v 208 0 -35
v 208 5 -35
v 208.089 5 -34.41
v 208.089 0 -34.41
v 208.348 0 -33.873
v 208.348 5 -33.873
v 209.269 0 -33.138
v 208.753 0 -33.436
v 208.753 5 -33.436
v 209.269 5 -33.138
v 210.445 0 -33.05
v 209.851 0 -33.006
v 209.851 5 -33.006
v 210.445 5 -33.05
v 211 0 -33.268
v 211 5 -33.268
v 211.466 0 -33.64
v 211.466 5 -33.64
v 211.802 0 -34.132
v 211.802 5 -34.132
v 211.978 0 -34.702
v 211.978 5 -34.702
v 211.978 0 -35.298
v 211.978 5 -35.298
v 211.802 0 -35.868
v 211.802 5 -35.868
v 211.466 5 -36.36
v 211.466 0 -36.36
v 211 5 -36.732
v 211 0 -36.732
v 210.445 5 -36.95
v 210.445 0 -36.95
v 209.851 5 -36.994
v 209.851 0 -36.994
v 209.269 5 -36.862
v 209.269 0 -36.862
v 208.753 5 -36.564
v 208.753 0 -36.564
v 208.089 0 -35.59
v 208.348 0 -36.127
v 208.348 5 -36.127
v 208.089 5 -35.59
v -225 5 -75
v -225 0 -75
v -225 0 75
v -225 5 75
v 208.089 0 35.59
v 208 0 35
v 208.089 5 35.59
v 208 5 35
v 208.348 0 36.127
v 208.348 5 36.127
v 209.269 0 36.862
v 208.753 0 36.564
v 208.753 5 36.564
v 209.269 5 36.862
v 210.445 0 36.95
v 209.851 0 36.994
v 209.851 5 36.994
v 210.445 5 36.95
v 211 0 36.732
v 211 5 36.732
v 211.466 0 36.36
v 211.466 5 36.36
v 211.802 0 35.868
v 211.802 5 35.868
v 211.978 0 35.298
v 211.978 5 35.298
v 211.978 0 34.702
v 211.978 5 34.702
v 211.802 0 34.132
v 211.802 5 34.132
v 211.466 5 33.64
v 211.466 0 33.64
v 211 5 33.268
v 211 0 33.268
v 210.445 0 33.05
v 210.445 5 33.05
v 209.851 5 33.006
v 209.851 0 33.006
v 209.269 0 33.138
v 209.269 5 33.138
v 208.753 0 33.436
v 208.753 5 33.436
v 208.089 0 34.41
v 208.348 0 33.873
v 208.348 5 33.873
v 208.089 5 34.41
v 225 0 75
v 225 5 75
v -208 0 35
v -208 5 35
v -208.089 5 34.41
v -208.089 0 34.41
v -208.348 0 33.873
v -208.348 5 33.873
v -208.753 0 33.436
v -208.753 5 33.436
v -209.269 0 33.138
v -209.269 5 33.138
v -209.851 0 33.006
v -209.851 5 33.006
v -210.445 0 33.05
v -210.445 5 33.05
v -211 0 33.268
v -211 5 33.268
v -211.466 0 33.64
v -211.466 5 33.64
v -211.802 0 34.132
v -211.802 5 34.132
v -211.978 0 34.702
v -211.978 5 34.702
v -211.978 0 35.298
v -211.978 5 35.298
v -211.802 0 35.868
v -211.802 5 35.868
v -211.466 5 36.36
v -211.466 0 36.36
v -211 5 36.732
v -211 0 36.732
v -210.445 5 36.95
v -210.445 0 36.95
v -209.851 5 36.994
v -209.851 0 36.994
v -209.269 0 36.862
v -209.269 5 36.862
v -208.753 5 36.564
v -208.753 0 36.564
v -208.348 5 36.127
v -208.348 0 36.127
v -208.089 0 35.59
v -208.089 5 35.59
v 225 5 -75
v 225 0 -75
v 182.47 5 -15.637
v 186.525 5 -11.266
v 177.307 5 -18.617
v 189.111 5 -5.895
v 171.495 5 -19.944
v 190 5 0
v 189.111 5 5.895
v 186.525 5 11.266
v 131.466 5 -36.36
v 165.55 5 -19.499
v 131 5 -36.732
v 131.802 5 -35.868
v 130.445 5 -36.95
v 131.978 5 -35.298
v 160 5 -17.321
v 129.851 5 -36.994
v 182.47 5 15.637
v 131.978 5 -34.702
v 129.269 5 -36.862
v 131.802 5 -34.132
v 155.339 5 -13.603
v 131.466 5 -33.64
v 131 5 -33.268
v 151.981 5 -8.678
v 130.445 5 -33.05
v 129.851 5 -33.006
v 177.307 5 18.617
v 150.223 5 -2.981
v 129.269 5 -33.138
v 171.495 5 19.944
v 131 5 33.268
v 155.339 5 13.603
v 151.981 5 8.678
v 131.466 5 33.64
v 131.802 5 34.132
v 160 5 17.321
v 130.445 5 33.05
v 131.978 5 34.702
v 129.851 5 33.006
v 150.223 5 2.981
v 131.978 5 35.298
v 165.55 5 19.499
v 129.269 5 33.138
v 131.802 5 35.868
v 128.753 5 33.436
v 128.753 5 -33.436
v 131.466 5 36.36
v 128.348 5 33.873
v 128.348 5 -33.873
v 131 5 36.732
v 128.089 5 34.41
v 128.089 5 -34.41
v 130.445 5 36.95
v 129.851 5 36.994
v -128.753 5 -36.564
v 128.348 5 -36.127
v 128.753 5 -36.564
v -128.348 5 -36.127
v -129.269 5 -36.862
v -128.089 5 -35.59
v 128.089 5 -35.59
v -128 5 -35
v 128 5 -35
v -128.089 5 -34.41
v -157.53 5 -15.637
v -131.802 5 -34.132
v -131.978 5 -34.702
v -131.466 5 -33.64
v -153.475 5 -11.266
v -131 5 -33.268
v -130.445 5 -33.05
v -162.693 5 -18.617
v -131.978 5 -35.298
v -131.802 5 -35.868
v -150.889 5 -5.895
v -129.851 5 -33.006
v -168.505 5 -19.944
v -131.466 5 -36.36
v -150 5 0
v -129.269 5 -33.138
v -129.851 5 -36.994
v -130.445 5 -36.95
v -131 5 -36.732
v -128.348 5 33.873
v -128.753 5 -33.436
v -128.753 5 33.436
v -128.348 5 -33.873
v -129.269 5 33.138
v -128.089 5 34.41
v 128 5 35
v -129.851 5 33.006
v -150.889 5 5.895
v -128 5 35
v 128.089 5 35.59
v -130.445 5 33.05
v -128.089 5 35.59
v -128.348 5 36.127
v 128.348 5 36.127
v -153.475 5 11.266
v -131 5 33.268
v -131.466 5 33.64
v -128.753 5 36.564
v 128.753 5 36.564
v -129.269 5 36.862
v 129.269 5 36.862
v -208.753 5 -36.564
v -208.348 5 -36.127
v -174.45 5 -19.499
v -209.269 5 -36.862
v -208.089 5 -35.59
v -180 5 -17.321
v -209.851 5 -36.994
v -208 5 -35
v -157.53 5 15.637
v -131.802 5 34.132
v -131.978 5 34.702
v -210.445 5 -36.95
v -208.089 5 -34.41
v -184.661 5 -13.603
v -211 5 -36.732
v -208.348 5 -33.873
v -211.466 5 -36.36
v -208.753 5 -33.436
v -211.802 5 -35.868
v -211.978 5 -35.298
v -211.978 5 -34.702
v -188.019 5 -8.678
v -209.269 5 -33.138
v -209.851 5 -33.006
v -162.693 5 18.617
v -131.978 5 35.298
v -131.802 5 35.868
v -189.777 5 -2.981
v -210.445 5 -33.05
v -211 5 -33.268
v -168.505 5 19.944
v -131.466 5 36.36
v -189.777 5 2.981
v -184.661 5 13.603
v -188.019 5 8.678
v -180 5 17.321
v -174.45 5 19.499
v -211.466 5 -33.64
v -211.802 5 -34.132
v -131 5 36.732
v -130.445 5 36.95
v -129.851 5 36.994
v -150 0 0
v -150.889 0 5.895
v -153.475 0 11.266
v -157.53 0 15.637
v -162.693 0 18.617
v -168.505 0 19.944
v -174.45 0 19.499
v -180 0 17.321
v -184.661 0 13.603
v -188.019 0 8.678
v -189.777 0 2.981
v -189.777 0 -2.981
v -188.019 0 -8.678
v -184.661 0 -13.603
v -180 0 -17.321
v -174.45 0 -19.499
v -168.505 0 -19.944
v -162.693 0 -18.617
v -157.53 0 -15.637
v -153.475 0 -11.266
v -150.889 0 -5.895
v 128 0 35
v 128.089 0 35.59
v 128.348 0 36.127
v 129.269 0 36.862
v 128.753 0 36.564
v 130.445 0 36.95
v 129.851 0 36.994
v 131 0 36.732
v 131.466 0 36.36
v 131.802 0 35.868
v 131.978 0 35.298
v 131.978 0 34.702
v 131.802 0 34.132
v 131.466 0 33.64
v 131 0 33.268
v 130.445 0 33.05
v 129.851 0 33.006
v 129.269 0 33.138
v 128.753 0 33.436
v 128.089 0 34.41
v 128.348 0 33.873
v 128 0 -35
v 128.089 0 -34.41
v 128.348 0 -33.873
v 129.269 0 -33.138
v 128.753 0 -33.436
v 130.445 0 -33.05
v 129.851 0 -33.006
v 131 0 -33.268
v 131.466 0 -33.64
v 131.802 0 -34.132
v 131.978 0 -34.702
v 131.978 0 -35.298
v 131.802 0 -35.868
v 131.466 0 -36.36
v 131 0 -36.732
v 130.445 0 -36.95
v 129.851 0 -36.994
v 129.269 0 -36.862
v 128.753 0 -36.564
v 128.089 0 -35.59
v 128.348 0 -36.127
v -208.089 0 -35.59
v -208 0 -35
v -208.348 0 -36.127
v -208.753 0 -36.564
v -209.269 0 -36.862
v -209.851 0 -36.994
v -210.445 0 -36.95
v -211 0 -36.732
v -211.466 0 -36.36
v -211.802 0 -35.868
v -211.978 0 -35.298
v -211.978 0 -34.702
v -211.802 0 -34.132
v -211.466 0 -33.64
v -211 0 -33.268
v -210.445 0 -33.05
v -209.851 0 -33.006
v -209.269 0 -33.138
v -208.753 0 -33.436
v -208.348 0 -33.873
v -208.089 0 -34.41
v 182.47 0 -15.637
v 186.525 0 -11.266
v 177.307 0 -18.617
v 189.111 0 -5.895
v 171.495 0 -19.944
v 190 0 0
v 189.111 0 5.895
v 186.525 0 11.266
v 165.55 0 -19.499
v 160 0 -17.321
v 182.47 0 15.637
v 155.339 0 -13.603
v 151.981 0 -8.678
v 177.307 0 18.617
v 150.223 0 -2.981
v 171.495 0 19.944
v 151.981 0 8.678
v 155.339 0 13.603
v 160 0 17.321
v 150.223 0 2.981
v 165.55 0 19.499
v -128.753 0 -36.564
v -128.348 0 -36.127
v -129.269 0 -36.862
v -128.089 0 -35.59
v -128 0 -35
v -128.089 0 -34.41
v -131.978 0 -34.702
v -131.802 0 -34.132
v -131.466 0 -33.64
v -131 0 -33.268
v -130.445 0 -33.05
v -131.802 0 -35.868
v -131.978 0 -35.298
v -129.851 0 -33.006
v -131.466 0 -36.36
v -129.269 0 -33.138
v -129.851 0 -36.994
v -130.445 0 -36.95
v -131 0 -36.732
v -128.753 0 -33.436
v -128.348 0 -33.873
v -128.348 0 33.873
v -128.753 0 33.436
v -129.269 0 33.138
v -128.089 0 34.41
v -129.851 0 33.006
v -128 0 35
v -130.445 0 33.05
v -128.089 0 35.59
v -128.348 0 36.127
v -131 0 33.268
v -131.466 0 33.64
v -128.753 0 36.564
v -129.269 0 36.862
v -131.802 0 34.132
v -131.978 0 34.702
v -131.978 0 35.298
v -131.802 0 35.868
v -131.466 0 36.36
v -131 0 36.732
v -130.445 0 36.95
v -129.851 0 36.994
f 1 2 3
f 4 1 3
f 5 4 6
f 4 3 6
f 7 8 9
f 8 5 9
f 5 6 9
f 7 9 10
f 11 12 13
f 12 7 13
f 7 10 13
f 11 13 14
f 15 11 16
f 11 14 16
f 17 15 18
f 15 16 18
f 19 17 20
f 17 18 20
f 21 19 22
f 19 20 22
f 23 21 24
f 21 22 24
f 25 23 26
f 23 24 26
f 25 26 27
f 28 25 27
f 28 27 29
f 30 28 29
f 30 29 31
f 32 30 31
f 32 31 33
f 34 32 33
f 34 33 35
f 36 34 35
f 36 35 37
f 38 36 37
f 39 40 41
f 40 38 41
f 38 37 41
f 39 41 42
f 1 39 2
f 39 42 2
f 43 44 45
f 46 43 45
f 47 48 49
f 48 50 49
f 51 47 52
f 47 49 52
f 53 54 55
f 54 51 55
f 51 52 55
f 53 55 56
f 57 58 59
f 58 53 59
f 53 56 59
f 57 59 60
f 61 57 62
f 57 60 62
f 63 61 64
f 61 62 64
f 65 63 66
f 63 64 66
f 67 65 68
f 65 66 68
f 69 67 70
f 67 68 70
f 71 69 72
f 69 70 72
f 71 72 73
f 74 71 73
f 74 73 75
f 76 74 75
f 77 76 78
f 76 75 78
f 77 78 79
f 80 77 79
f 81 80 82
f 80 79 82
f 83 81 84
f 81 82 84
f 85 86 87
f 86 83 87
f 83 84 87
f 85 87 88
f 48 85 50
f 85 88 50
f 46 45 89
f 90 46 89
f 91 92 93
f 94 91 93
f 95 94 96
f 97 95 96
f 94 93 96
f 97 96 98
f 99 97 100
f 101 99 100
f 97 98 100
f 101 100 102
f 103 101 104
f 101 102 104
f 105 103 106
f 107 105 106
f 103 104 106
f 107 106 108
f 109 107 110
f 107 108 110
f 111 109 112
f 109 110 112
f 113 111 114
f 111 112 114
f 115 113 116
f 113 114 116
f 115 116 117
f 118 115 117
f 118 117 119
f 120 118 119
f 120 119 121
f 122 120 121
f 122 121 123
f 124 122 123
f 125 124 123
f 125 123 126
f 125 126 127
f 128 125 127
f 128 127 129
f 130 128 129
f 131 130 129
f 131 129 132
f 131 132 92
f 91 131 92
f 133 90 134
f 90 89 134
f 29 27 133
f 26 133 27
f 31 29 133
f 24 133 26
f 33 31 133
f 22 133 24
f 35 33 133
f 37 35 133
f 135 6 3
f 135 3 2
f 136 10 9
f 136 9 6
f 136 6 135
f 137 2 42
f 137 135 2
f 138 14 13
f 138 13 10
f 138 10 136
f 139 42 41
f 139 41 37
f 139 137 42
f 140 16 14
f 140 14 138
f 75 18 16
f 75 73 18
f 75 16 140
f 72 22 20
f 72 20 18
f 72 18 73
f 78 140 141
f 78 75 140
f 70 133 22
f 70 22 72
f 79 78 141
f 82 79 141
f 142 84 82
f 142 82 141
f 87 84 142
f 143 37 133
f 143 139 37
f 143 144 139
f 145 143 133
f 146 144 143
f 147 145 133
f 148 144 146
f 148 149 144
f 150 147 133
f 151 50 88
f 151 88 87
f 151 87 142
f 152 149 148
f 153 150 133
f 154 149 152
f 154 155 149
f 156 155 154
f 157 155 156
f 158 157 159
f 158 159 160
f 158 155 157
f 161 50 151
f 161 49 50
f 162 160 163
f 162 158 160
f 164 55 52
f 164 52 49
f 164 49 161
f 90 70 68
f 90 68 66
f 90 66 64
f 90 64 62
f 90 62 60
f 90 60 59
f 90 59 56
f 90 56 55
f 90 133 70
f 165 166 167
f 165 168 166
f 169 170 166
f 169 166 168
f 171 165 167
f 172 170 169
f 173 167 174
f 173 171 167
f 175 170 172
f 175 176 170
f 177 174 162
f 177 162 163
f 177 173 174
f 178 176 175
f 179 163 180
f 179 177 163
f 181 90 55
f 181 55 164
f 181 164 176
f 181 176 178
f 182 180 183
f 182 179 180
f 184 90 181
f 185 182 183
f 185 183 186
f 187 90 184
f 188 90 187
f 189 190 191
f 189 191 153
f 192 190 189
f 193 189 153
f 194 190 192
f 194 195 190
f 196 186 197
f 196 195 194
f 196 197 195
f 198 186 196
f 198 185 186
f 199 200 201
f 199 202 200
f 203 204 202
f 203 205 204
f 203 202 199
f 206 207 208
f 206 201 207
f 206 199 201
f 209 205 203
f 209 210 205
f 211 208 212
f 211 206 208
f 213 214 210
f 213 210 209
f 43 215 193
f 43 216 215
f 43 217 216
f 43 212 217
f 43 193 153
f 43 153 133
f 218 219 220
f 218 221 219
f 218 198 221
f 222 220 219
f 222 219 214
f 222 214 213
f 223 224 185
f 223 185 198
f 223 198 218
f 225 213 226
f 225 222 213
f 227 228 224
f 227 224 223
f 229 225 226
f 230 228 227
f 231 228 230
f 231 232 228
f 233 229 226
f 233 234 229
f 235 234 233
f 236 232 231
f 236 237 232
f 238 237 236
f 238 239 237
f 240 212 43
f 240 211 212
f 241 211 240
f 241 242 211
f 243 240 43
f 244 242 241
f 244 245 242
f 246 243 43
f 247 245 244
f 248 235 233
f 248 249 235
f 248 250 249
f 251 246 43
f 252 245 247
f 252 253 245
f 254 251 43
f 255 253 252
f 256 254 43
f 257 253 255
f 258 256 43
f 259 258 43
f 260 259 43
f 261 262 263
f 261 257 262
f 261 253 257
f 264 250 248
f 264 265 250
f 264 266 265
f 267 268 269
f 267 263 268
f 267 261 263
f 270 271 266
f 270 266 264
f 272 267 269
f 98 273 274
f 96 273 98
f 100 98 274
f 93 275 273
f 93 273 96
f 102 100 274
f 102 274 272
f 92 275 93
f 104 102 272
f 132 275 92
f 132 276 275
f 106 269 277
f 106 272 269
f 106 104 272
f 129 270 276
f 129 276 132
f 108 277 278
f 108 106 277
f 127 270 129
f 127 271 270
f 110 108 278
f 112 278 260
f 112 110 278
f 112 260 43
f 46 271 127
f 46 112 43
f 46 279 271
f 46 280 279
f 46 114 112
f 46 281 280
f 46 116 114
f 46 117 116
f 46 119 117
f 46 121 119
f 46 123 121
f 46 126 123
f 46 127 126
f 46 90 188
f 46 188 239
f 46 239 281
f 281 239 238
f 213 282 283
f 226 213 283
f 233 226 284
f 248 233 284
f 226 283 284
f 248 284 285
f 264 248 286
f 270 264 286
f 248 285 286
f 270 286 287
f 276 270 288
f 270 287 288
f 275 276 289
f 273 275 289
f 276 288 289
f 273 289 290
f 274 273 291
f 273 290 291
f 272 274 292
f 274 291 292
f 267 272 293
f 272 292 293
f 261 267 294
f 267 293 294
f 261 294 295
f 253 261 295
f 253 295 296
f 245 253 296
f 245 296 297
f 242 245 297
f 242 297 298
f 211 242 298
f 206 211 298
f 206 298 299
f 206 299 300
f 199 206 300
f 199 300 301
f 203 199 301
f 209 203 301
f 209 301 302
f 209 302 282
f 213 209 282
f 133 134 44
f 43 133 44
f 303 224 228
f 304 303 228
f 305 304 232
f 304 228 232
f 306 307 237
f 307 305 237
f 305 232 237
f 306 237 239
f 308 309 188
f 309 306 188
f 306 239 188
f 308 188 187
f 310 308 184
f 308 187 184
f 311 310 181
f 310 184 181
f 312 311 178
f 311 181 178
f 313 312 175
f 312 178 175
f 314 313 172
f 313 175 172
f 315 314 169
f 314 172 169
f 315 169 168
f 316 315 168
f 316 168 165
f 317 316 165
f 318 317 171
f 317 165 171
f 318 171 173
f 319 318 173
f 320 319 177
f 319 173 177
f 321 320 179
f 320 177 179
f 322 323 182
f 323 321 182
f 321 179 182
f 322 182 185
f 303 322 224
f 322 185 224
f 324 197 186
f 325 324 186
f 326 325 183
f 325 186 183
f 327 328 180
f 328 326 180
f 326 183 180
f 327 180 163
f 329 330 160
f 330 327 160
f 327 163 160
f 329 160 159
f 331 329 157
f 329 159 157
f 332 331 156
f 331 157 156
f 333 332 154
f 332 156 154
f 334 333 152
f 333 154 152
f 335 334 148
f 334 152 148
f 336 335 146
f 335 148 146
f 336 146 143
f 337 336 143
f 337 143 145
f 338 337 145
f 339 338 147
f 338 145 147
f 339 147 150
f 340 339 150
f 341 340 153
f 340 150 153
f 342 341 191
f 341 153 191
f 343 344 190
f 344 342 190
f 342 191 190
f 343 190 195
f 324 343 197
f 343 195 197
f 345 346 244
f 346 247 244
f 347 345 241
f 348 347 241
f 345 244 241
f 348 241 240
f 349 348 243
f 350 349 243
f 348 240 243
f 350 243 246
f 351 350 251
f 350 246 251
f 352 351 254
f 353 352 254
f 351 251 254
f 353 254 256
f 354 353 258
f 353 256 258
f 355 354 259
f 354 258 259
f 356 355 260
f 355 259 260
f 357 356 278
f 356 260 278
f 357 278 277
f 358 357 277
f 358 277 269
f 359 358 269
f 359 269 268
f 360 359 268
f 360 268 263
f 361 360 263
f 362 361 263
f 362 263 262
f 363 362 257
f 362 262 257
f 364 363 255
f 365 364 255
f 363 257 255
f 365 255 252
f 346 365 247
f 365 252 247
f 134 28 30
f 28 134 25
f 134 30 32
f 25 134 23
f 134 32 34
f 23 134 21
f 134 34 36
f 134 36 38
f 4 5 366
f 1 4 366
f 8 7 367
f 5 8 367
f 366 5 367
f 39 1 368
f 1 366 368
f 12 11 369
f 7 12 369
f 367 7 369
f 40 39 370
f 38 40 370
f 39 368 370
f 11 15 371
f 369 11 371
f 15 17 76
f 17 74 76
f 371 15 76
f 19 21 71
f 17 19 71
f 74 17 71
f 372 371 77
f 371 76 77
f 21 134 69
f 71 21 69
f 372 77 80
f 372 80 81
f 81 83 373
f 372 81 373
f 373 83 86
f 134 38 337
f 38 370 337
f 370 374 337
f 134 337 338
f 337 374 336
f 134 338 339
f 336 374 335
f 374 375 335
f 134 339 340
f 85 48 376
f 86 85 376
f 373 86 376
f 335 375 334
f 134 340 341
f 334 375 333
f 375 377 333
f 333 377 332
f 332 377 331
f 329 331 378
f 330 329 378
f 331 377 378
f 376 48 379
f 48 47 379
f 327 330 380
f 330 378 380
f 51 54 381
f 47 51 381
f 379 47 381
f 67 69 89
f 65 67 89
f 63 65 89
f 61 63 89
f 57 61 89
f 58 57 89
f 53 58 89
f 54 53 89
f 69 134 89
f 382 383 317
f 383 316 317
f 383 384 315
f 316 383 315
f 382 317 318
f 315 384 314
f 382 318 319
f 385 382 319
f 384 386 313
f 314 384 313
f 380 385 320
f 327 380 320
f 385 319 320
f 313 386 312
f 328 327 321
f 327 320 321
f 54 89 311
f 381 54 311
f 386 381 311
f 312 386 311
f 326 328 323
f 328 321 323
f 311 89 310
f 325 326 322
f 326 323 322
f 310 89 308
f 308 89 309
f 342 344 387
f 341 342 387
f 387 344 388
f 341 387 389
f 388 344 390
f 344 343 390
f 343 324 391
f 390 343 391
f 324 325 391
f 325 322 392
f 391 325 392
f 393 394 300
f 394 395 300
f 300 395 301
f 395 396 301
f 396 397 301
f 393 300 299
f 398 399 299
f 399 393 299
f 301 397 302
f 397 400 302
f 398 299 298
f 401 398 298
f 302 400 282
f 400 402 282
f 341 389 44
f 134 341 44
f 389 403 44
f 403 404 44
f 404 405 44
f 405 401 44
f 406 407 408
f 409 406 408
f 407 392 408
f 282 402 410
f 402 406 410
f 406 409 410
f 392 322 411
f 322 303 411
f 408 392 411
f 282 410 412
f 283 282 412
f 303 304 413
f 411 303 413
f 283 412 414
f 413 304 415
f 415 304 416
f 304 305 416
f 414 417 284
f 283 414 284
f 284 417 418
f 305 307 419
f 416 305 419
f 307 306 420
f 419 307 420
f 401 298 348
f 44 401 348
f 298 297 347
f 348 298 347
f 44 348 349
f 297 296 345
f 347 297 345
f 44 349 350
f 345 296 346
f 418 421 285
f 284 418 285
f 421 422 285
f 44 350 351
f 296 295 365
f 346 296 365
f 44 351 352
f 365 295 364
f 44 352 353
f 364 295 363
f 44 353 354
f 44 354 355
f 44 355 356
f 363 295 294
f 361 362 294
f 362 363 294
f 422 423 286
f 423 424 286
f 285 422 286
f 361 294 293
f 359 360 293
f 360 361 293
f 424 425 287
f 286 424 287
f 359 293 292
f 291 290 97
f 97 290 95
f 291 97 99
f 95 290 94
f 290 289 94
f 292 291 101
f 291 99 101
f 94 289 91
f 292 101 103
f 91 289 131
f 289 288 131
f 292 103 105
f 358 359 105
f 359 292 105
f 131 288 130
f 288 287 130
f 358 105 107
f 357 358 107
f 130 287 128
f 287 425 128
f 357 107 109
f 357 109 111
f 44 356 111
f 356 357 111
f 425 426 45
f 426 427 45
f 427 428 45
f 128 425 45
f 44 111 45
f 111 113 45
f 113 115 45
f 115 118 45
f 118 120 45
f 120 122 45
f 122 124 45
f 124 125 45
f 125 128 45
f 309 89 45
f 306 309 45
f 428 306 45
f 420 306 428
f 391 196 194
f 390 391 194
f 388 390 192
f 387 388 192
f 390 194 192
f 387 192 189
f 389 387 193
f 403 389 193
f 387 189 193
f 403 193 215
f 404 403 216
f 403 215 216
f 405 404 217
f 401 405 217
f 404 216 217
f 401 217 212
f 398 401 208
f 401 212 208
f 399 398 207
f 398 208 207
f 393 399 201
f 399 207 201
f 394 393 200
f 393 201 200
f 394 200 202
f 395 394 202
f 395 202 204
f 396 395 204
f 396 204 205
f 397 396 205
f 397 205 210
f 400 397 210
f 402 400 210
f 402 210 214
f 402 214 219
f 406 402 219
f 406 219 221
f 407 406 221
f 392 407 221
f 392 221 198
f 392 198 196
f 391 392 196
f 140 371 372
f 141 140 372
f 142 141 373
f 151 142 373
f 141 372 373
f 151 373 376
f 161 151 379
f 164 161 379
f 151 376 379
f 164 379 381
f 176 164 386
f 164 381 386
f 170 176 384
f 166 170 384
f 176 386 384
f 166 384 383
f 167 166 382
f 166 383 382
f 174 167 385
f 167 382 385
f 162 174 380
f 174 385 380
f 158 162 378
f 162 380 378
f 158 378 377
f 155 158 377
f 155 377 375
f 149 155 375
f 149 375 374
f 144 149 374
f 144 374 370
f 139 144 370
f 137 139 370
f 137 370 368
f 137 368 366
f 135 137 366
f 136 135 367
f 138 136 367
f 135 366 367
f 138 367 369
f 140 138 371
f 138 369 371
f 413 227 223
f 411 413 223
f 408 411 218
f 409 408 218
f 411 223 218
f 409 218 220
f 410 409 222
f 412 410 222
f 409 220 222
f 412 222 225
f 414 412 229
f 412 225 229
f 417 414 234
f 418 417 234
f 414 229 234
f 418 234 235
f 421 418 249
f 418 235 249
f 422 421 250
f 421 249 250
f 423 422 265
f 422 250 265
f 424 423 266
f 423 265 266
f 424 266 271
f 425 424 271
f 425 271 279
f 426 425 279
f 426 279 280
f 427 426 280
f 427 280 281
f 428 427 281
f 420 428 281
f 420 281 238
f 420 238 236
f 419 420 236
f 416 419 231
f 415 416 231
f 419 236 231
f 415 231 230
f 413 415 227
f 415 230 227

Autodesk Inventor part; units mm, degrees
ref_plane "YZ Plane" through (0, 0, 0) normal (1, 0, 0) x (0, 1, 0)
ref_plane "XZ Plane" through (0, 0, 0) normal (0, 1, 0) x (-1, 0, 0)
ref_plane "XY Plane" through (0, 0, 0) normal (0, 0, 1) x (1, 0, 0)
sketch "Sketch1" plane through (0, 0, 0) normal (0, 1, 0) x (-1, 0, 0)
  line L0 (225, 75) -> (-225, 75)
  line L1 (-225, 75) -> (-225, -75)
  line L2 (-225, -75) -> (225, -75)
  line L3 (225, -75) -> (225, 75)
  line L4 (225, 75) -> (-225, -75) construction
  line L5 (-225, 75) -> (225, -75) construction
  point P0 (0, 0)
  dimension "d0" = 450
  dimension "d1" = 150
extrude "Extrusion1" add sketch "Sketch1" along normal blind 5
sketch "Sketch2" plane through (0, 5, 0) normal (0, 1, 0) x (1, 0, 0)
  circle A0 centre (-210, -35) radius 2.05 projected
  circle A1 centre (-130, 35) radius 2.05 projected
  circle A2 centre (-130, -35) radius 2.05 projected
  circle A3 centre (-210, 35) radius 2.05 projected
  arc A4 (-190.5, 40) -> (-194.5, 44.899) centre (-195.5, 40) ccw projected
  line L0 (-190.5, 40) -> (-190.5, -20) projected
  line L1 (-190.5, -20) -> (-149.5, -20) projected
  line L2 (-149.5, -20) -> (-149.5, 56) projected
  line L3 (-180, 56) -> (-180, 75) projected
  line L4 (-180, 75) -> (-120, 75) projected
  line L5 (-120, 75) -> (-120, -75) projected
  line L6 (-120, -75) -> (-220, -75) projected
  line L7 (-220, -75) -> (-220, 75) projected
  line L8 (-220, 75) -> (-198.5, 75) projected
  line L9 (-198.5, 75) -> (-198.5, 49.798) projected
  arc A5 (-198.5, 49.798) -> (-194.5, 44.899) centre (-193.5, 49.798) ccw projected
  circle A6 centre (-210, 35) radius 2
  circle A7 centre (-210, -35) radius 2
  circle A8 centre (-130, -35) radius 2
  circle A9 centre (-130, 35) radius 2
  line L10 (-149.5, 56) -> (-180, 56) projected
  point P0 (0, 0)
  dimension "d4" = 4
  dimension "d5" = 4
  dimension "d6" = 4
  dimension "d7" = 4
extrude "Extrusion2" cut sketch "Sketch2" against normal blind 5 contours A6 | A7 | A8 | A9
mirror "Mirror1" about plane through (0, 0, 0) normal (1, 0, 0) of "Extrusion2"
sketch "Sketch4" plane through (0, 0, 0) normal (0, -1, 0) x (1, 0, 0)
  line L0 (62, 45) -> (62, 5) projected
  circle A0 centre (210, -35) radius 2 projected
  circle A1 centre (130, -35) radius 2 projected
  circle A2 centre (210, 35) radius 2 projected
  circle A3 centre (130, 35) radius 2 projected
  circle A4 centre (-130, 35) radius 2 projected
  circle A5 centre (-210, 35) radius 2 projected
  circle A6 centre (-130, -35) radius 2 projected
  circle A7 centre (-210, -35) radius 2 projected
  line L1 (225, 75) -> (225, -75) projected
  line L2 (-225, 75) -> (225, 75) projected
  line L3 (-225, -75) -> (-225, 75) projected
  line L4 (225, -75) -> (-225, -75) projected
  circle A8 centre (-170, 0) radius 20
  circle A9 centre (170, 0) radius 20
  point P0 (0, 0)
  dimension "d16" = 40
  dimension "d17" = 40
extrude "Extrusion4" cut sketch "Sketch4" against normal blind 5 contours A8 | A9
properties part number "acrylic_back"
